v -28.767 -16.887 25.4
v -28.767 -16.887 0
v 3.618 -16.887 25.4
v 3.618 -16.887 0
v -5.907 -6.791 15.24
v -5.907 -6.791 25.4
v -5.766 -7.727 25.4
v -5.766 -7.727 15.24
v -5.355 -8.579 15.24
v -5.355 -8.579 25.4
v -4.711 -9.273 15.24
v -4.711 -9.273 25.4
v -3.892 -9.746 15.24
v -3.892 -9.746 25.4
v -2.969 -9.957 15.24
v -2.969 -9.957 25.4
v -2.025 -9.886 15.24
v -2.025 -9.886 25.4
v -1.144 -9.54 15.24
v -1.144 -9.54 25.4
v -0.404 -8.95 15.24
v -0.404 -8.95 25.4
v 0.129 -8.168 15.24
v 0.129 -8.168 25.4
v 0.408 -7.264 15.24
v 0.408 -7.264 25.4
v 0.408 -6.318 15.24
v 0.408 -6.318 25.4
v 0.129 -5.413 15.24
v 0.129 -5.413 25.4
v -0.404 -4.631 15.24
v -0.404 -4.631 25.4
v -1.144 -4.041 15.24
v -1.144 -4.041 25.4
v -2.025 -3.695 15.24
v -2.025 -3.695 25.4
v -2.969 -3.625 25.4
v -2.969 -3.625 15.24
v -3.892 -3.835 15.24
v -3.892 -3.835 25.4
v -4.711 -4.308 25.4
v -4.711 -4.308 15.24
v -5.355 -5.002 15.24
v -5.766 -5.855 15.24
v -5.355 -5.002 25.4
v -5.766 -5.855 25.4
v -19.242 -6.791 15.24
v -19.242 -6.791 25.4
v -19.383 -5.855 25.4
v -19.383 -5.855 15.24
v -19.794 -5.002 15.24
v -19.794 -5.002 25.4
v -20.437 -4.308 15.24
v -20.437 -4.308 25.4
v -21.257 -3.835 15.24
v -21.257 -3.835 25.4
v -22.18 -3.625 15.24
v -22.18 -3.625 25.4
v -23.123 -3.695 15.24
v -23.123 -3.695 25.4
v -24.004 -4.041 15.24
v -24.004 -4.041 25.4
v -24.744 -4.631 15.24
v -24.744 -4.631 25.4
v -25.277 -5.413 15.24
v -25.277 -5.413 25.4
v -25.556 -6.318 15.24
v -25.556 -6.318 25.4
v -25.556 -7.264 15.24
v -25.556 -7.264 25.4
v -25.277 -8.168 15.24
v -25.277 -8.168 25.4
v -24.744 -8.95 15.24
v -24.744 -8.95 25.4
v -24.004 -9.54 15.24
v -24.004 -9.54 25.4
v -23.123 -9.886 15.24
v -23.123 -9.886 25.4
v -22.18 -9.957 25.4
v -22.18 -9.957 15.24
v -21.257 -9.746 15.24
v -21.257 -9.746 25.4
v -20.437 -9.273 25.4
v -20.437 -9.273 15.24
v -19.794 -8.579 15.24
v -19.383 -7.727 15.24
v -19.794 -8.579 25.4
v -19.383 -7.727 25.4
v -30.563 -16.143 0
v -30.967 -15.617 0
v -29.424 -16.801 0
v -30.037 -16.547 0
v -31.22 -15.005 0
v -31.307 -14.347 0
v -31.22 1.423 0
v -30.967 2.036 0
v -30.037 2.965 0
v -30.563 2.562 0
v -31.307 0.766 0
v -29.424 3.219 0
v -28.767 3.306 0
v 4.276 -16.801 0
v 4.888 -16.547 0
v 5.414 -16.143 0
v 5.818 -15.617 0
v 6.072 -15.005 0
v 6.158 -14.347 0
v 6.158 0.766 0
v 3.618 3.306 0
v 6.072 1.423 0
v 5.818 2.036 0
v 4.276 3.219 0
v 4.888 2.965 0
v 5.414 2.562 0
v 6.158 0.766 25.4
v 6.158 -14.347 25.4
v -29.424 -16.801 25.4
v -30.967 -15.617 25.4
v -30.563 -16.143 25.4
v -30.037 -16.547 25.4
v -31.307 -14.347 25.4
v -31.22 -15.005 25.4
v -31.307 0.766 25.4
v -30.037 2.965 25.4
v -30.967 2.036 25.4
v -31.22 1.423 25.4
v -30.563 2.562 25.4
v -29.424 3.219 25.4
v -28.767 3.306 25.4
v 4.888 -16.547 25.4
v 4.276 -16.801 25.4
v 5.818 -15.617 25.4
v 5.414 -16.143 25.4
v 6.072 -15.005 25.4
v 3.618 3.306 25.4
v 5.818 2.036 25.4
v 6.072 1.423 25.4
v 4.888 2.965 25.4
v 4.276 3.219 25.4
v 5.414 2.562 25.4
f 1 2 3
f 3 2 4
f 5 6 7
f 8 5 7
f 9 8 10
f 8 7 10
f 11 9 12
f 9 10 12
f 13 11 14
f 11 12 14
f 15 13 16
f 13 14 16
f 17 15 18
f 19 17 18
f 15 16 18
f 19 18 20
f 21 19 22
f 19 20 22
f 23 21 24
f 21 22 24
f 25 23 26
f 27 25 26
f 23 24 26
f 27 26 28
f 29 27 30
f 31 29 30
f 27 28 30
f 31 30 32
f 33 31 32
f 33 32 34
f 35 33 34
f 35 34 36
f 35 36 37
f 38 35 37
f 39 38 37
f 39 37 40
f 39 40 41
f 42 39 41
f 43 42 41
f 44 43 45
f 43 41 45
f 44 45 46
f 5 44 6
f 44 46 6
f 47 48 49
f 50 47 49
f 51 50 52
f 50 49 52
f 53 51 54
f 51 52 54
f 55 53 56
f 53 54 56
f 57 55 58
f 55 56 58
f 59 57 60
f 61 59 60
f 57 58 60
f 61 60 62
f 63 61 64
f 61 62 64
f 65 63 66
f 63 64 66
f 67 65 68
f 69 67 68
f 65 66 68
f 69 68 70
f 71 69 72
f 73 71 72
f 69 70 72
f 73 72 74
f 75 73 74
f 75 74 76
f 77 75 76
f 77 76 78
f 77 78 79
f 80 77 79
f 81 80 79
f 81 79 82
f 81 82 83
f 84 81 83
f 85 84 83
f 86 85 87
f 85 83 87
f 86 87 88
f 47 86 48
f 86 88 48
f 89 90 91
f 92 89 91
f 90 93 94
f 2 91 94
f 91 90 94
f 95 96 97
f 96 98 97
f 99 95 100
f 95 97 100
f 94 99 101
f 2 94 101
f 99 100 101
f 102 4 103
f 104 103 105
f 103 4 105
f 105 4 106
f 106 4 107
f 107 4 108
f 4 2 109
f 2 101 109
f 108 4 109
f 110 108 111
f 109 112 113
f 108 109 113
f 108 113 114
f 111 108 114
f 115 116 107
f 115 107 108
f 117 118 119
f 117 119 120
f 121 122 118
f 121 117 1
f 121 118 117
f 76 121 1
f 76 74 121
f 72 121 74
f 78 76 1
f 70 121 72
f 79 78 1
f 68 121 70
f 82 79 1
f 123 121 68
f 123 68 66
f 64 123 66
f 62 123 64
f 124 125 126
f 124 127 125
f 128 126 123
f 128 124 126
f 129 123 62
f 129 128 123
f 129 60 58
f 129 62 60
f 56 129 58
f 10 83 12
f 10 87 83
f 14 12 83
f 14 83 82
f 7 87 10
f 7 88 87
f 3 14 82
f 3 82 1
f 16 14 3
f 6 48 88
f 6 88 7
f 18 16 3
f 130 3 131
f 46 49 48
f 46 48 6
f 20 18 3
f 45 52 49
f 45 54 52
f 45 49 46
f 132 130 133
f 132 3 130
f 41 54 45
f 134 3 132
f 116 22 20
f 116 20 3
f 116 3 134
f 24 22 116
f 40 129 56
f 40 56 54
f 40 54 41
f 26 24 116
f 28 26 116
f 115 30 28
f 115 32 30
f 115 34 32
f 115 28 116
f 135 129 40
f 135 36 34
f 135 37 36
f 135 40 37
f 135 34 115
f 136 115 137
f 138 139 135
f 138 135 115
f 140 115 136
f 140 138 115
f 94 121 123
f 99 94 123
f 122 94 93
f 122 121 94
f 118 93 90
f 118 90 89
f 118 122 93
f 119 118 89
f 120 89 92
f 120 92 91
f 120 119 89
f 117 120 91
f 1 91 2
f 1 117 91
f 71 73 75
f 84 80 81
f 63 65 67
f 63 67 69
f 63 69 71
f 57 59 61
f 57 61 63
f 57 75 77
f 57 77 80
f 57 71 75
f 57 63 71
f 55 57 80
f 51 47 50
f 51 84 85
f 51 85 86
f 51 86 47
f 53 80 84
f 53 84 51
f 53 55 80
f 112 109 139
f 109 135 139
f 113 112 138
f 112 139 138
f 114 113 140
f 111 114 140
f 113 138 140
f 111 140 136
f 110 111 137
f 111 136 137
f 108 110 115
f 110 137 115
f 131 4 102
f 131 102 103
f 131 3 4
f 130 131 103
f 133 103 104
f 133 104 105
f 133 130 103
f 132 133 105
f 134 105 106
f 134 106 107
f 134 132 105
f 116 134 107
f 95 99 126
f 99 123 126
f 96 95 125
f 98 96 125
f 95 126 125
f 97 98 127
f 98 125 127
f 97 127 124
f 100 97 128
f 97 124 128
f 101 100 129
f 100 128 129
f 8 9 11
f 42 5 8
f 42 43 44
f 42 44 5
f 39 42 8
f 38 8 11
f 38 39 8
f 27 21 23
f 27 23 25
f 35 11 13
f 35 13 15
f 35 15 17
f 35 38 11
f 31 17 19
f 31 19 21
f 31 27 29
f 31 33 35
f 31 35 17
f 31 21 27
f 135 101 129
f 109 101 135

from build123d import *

# Parameters (mm, degrees)
F0_W     = 37.465
F0_H     = 20.193
F1_DEPTH = 25.4
F3_DEPTH = 10.16
F4_R     = 2.54


with BuildPart() as f1:
    # F0 (on Top) → F1 (new body)
    with BuildSketch(Plane.XY):
        with Locations((-12.5743107353, -6.7907468112)):
            Rectangle(F0_W, F0_H)
    extrude(amount=F1_DEPTH)

    # F2 (on face) → F3 (cut)
    with BuildSketch(Plane.XY.offset(25.4)):
        with BuildLine():
            ThreePointArc((-25.5918107353, -6.7907468112), (-22.4168107353, -9.9657468112), (-19.2418107353, -6.7907468112))
            Line((-19.2418107353, -6.7907468112), (-25.5918107353, -6.7907468112))
        make_face()
        with BuildLine():
            Line((-25.5918107353, -6.7907468112), (-19.2418107353, -6.7907468112))
            ThreePointArc((-19.2418107353, -6.7907468112), (-22.4168107353, -3.6157468112), (-25.5918107353, -6.7907468112))
        make_face()
        with BuildLine():
            Line((-5.9068107353, -6.7907468112), (0.4431892647, -6.7907468112))
            ThreePointArc((0.4431892647, -6.7907468112), (-2.7318107353, -3.6157468112), (-5.9068107353, -6.7907468112))
        make_face()
        with BuildLine():
            ThreePointArc((-5.9068107353, -6.7907468112), (-2.7318107353, -9.9657468112), (0.4431892647, -6.7907468112))
            Line((0.4431892647, -6.7907468112), (-5.9068107353, -6.7907468112))
        make_face()
    extrude(amount=-F3_DEPTH, mode=Mode.SUBTRACT)

    # F4
    f4_edges = [f1.edges().sort_by_distance(p)[0] for p in [
        (-31.306811, -16.887247, 12.7),
        (6.158189, -16.887247, 12.7),
        (6.158189, 3.305753, 12.7),
        (-31.306811, 3.305753, 12.7),
    ]]
    fillet(f4_edges, radius=F4_R)


solid = f1.part
